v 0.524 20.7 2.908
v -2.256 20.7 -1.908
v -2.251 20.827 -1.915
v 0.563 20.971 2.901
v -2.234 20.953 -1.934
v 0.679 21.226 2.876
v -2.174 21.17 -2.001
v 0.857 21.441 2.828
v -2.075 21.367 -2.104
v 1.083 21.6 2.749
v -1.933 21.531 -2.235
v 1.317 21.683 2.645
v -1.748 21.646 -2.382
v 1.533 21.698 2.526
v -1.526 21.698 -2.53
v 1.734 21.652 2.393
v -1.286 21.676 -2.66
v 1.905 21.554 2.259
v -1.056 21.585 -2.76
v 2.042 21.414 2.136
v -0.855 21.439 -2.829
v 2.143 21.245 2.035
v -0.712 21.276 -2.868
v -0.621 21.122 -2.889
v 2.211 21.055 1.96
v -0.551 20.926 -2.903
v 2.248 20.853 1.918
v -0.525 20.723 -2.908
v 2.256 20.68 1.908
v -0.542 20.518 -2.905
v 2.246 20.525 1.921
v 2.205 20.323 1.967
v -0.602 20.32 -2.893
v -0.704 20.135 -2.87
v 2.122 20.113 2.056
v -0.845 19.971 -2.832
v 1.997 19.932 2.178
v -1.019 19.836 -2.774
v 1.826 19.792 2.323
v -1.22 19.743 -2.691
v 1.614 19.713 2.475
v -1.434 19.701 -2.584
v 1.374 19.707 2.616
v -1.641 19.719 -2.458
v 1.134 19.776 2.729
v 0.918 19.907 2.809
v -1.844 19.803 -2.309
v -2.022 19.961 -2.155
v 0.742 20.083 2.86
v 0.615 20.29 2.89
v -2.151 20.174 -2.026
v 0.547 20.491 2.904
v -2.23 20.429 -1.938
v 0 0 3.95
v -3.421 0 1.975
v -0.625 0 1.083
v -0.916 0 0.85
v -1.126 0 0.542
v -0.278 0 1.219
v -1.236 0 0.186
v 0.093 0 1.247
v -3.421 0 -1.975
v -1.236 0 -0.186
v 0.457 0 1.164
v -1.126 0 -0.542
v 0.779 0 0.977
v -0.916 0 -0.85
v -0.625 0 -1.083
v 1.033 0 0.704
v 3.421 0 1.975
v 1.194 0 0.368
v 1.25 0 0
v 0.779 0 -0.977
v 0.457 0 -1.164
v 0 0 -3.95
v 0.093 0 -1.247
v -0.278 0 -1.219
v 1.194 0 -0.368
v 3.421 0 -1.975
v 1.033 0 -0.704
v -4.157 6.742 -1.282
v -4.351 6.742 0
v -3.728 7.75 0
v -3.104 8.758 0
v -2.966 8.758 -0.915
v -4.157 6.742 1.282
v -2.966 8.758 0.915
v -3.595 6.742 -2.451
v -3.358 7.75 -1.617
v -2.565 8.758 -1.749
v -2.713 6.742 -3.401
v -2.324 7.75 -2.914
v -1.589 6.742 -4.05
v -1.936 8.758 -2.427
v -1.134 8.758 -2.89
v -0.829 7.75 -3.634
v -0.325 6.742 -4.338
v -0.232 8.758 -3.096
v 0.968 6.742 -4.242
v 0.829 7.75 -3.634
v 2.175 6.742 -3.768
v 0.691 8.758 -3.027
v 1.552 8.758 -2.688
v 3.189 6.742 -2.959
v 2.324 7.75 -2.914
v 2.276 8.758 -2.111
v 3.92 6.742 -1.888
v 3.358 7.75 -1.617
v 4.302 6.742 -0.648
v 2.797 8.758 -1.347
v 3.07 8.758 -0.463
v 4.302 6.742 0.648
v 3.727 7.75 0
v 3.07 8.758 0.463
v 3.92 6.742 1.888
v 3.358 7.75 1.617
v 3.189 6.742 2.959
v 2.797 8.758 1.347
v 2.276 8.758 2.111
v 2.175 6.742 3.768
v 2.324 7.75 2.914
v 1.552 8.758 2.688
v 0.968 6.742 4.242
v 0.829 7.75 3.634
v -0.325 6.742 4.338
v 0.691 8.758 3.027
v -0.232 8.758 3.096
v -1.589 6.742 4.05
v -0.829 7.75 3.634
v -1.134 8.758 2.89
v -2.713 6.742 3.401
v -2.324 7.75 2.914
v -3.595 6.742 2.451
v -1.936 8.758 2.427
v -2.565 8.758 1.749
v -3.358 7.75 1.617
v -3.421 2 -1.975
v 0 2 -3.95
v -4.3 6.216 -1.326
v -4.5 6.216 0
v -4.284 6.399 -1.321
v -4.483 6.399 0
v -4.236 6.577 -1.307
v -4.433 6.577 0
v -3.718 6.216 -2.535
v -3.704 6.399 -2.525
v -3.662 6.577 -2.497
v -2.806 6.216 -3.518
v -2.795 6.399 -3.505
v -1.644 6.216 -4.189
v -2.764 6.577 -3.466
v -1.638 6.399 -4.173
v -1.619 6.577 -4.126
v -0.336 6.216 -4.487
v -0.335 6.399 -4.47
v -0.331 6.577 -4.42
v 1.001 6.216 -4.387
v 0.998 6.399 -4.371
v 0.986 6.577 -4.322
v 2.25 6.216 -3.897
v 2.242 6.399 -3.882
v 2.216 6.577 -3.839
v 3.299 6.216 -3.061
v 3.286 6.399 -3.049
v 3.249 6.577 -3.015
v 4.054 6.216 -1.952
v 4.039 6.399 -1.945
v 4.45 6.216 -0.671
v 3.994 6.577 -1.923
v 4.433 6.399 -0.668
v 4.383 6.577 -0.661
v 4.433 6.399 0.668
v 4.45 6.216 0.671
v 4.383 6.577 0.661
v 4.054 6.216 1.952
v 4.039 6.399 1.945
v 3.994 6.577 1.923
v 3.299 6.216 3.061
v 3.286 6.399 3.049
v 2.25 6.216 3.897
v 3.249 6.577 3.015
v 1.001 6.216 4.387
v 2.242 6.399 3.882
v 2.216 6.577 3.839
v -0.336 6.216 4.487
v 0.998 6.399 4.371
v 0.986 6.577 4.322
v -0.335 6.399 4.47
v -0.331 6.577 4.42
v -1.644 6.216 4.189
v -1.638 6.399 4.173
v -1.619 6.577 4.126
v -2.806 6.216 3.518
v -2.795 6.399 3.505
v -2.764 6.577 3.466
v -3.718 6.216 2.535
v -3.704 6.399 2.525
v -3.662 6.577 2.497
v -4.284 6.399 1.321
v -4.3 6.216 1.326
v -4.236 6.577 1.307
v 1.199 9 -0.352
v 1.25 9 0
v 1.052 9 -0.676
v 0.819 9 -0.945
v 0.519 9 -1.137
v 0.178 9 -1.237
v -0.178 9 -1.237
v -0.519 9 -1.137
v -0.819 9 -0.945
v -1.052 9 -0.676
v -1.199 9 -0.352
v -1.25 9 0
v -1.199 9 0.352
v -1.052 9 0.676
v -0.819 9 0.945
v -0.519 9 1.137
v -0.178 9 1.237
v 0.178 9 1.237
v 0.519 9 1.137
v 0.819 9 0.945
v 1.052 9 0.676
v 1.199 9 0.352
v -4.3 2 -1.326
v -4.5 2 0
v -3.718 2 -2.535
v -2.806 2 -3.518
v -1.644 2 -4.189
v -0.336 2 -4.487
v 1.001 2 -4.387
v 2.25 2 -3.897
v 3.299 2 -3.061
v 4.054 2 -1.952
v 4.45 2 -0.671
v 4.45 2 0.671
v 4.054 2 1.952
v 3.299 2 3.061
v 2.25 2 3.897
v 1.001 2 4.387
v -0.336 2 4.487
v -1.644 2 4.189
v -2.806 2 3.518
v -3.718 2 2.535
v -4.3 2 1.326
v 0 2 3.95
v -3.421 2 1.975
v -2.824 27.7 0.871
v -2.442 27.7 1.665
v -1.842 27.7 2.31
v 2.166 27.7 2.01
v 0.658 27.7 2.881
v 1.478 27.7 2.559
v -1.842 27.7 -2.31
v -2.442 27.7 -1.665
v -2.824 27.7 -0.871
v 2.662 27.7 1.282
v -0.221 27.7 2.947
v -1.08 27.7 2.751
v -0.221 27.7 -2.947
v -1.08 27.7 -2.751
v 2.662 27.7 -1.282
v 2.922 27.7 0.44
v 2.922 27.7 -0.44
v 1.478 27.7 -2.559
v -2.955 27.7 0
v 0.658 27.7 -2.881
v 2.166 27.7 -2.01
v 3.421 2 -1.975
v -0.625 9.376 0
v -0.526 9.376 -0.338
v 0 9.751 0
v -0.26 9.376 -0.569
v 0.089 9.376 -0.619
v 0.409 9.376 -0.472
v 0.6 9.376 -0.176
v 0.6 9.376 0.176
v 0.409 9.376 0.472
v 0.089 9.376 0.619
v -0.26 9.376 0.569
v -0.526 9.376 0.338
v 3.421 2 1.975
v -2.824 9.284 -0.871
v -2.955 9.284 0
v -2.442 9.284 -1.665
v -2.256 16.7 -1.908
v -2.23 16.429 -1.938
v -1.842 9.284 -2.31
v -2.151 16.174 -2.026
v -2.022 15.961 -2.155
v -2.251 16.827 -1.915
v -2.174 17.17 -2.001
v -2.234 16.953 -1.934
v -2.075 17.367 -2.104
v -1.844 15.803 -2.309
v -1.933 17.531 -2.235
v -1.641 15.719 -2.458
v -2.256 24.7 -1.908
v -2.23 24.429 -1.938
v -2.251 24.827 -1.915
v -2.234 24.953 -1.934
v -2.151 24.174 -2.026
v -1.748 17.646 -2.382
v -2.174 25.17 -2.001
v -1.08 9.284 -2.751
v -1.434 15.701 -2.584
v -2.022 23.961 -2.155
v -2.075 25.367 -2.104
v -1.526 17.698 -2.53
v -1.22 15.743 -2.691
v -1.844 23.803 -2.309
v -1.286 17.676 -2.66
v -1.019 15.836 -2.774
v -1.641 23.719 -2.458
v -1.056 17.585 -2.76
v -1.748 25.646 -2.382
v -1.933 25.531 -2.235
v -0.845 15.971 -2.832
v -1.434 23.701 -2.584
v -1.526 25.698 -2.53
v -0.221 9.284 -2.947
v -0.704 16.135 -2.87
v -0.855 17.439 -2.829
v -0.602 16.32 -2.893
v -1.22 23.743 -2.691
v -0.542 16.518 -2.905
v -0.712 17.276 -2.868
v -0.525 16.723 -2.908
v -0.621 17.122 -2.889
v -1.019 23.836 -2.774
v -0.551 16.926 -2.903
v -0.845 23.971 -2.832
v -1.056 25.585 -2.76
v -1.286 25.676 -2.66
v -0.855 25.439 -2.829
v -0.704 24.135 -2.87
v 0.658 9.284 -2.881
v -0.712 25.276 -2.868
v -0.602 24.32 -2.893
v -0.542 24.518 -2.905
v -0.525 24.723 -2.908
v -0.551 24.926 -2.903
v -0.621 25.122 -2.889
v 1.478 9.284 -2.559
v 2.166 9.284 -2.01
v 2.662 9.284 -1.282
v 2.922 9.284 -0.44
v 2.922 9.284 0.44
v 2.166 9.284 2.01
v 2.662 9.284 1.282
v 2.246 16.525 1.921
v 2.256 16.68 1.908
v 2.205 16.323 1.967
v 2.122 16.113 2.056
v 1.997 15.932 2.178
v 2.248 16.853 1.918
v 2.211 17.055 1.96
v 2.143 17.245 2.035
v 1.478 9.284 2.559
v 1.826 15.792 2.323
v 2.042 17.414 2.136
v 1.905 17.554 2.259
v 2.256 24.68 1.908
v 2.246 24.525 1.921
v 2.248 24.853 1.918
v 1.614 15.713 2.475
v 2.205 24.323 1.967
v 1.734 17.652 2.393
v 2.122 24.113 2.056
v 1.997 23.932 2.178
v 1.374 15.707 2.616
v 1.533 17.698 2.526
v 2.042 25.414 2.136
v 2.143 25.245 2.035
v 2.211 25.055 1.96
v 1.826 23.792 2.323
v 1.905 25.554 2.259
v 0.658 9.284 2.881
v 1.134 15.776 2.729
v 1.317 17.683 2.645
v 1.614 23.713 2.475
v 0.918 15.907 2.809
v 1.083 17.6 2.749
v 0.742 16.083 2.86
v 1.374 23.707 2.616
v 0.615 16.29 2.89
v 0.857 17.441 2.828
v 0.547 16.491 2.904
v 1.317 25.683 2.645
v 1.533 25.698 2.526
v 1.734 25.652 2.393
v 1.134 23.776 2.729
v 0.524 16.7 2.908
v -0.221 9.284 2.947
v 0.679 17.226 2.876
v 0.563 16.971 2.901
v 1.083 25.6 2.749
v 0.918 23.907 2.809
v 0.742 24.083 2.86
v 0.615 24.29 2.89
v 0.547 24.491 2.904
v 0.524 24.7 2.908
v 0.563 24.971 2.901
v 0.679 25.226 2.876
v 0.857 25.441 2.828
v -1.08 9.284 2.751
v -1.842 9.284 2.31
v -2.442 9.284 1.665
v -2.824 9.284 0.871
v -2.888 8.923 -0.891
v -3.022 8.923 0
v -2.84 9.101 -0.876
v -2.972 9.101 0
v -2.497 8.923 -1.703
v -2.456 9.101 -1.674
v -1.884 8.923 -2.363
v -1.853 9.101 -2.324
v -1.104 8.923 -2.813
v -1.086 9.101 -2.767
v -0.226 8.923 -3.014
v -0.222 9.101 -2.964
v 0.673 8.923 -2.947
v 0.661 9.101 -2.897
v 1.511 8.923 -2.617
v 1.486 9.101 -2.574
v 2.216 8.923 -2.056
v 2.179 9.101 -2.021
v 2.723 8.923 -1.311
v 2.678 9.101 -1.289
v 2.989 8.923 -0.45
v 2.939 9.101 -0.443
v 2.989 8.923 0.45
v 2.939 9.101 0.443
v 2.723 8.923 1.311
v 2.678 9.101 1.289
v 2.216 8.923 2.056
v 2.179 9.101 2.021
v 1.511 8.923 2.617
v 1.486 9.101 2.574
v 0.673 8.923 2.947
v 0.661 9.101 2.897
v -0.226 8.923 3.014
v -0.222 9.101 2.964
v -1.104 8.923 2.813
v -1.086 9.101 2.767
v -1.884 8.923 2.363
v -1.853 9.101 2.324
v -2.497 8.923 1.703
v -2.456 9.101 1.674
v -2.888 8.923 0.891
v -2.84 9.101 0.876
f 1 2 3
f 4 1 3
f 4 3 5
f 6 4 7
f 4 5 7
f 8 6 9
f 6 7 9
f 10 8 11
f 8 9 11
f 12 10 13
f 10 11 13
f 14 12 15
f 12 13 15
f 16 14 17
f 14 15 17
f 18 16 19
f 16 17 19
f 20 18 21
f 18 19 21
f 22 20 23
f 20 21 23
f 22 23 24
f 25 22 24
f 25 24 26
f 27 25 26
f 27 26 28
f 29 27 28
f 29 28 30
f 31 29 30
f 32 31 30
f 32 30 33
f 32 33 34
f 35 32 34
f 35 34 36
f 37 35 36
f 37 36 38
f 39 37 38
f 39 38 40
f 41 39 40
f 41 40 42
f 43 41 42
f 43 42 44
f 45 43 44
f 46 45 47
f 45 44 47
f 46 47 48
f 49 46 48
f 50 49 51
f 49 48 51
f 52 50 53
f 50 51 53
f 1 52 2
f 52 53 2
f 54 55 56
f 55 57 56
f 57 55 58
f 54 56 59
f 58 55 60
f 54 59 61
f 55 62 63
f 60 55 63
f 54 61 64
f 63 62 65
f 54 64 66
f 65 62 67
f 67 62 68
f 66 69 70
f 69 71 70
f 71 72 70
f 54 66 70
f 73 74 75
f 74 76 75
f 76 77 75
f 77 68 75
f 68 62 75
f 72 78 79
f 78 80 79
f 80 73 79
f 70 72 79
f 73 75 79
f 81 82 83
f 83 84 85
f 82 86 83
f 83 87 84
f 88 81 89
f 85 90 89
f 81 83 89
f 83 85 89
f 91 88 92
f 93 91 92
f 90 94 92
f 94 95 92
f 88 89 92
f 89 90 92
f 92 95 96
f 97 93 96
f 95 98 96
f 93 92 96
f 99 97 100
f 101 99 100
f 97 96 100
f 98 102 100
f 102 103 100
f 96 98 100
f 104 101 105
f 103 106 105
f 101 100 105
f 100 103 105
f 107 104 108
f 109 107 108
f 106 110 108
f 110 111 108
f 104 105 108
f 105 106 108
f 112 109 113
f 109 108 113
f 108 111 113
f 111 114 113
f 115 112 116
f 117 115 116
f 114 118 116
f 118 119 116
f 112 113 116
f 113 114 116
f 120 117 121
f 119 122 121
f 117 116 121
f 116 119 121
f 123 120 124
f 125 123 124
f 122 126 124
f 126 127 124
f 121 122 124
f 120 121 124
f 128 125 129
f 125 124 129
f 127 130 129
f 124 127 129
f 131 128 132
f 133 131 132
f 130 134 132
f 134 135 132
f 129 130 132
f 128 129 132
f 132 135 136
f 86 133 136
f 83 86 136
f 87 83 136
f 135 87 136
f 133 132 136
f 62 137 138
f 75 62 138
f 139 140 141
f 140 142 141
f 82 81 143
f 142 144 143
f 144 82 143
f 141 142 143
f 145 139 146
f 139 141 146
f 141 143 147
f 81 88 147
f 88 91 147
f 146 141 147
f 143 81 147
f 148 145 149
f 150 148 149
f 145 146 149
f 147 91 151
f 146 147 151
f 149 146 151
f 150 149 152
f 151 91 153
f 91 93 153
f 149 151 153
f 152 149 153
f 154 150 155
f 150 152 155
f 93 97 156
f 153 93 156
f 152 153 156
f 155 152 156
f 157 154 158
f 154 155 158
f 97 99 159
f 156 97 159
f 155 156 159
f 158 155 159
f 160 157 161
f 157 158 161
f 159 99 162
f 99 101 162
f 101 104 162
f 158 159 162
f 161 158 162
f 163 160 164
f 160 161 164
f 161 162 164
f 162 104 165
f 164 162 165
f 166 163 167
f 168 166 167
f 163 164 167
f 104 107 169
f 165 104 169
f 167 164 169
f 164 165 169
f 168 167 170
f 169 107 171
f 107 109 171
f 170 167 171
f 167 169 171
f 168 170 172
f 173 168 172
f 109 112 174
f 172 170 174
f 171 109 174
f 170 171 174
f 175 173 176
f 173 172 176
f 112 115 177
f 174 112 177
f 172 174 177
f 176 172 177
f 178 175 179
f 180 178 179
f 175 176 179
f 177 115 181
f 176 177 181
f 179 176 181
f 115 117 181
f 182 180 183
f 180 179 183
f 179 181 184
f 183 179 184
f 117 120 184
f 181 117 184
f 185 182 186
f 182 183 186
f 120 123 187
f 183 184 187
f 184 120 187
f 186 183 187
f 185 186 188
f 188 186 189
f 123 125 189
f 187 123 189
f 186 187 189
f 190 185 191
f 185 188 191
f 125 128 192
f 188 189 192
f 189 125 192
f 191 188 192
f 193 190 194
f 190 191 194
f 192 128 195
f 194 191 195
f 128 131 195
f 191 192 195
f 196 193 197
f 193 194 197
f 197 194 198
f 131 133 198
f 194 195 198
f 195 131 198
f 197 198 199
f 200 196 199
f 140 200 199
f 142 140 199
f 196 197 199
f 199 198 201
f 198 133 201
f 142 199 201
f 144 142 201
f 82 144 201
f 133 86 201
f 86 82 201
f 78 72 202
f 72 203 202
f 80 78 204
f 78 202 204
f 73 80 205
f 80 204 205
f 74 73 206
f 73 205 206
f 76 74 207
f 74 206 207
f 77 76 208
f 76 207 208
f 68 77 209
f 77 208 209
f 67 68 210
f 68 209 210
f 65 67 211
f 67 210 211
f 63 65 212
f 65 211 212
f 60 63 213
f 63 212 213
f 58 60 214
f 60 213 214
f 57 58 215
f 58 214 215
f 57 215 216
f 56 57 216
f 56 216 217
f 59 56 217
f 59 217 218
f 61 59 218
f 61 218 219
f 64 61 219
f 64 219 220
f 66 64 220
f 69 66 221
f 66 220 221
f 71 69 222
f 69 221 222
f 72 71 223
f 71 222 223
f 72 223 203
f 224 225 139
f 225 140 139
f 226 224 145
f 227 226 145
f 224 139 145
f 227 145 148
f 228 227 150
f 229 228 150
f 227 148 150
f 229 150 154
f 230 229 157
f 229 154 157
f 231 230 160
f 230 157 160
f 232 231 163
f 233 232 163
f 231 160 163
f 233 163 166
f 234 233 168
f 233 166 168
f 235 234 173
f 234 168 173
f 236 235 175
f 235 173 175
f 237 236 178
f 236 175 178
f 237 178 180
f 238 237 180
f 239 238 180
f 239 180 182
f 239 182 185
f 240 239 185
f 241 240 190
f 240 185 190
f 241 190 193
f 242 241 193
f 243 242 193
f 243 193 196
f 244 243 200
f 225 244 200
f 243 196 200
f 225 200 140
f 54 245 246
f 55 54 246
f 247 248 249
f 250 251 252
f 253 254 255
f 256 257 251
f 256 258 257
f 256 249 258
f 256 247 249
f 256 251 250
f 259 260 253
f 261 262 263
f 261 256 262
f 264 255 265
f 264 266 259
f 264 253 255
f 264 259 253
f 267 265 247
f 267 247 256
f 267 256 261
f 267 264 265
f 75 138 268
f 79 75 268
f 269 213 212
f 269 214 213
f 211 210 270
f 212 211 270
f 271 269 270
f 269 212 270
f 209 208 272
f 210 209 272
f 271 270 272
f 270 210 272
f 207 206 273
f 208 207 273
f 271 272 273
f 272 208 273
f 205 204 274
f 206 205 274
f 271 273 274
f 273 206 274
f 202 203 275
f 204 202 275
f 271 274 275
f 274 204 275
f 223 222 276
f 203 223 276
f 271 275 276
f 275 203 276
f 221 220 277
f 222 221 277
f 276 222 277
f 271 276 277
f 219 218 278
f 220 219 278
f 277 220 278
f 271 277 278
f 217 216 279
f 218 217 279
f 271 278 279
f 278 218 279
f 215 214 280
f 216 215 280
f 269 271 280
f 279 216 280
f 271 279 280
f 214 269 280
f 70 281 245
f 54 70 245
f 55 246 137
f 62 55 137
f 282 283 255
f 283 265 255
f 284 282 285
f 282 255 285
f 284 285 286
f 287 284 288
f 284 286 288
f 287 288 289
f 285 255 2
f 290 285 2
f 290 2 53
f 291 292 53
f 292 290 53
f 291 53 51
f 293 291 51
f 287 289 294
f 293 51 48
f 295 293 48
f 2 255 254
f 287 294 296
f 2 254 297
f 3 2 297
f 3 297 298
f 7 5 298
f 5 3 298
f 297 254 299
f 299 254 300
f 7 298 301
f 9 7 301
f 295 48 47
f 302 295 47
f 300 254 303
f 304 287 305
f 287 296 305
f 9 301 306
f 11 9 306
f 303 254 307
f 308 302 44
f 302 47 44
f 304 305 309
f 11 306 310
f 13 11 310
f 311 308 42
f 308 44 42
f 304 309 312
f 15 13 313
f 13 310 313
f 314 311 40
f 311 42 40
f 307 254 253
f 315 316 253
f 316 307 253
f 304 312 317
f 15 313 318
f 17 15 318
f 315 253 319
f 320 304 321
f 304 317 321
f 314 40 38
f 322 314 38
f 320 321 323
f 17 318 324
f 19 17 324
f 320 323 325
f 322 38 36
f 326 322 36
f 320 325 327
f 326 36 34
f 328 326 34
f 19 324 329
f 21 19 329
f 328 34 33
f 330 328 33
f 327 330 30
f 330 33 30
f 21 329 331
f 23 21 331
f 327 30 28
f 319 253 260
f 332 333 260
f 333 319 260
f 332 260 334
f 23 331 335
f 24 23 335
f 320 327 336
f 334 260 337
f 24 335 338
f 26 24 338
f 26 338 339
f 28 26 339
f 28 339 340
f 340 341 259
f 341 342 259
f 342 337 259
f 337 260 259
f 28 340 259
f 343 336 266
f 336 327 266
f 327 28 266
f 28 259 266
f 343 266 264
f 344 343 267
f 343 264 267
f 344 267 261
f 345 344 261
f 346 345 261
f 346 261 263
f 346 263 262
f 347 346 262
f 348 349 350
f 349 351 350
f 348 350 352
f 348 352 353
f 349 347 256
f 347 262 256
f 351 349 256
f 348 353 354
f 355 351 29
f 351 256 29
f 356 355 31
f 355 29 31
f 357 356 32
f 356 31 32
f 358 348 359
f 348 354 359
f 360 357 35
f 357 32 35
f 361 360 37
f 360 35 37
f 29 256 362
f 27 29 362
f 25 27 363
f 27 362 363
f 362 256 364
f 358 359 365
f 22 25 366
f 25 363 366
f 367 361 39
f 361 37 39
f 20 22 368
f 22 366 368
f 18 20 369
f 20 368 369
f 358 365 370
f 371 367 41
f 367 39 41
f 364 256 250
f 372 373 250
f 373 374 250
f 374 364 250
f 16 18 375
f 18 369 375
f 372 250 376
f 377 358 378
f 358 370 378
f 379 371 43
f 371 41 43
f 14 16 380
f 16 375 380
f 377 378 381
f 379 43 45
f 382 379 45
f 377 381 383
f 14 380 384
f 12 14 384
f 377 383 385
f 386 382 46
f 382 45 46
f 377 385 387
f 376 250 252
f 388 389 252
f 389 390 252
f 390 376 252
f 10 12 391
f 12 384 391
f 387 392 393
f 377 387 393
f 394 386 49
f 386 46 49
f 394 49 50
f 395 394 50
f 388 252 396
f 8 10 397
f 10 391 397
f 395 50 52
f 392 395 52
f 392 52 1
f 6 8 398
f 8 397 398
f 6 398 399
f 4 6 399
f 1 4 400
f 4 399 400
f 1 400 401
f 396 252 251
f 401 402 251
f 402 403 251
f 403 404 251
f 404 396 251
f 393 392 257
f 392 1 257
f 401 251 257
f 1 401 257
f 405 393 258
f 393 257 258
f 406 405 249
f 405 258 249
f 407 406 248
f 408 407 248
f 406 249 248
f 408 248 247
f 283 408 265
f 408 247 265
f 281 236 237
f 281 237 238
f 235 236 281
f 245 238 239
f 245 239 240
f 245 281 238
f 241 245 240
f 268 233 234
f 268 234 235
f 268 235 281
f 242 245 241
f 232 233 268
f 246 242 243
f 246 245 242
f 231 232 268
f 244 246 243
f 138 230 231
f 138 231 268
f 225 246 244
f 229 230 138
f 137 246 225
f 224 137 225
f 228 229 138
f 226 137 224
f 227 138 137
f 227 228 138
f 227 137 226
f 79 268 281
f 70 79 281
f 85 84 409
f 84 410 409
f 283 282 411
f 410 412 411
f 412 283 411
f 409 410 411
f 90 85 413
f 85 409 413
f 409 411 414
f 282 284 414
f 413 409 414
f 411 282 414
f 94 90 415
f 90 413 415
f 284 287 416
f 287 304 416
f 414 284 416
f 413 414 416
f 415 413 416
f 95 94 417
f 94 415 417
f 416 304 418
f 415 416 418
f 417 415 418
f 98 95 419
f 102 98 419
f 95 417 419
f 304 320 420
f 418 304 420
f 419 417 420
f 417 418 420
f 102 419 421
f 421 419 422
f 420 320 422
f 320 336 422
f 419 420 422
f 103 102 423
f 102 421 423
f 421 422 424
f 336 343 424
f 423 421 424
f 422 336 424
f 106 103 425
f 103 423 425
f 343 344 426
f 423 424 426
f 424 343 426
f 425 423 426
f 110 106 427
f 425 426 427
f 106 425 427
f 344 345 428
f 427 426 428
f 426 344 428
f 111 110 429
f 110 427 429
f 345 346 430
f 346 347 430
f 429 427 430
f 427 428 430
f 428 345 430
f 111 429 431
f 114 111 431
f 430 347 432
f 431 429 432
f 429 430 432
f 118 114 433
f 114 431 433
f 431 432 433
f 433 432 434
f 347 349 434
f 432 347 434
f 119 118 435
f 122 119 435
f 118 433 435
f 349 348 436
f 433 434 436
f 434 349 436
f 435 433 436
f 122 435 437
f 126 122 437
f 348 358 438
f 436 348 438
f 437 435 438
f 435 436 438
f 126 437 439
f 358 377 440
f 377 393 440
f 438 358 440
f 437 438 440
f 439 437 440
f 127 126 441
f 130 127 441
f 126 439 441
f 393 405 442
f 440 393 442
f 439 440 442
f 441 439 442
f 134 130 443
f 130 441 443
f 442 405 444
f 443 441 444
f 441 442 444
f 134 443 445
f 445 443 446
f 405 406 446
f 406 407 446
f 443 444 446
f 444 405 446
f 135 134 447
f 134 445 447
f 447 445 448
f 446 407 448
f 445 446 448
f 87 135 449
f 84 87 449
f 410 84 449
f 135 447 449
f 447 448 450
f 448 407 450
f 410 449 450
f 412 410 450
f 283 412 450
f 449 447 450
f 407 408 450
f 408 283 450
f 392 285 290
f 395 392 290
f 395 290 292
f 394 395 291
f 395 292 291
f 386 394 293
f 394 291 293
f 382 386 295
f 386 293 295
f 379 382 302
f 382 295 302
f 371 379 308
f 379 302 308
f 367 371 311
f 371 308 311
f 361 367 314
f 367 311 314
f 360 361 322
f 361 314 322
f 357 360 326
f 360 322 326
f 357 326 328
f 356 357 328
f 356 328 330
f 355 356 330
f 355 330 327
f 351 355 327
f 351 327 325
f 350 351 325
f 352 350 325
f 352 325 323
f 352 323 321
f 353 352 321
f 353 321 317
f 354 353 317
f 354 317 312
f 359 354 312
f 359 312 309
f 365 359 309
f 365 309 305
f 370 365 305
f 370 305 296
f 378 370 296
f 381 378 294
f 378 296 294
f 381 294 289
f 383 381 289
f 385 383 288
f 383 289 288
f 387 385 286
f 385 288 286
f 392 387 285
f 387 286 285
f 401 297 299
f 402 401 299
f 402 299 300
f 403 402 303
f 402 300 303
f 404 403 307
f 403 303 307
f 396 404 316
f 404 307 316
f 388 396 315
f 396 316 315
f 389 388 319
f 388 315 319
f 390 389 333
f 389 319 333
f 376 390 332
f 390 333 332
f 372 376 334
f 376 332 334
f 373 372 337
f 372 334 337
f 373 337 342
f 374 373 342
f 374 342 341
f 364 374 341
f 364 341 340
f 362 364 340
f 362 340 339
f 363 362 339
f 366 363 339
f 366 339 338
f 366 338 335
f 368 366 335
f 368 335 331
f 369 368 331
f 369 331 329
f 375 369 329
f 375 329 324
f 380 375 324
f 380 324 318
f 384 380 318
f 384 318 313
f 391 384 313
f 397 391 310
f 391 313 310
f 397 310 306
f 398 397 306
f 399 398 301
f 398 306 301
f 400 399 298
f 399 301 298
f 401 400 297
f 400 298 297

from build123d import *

# Parameters (mm, degrees)
TAGLIO_ESTRUSIONE1_START      = -2
SCHIZZO2_R                    = 4.5
TAGLIO_ESTRUSIONE1_DEPTH      = 2
FORO_FILETTATO_M3X0_5_1_D     = 2.5
FORO_FILETTATO_M3X0_5_1_DEPTH = 9
FORO_FILETTATO_M3X0_5_1_TIP   = 0.751075774
SCHIZZO5_R                    = 1
TAGLIO_ESTRUSIONE2_DEPTH      = 34.021984674


with BuildPart() as part:
    # Schizzo1 → Rivoluzione1 (revolve)
    with BuildSketch(Plane.XY, mode=Mode.PRIVATE) as rivoluzione1_sk:
        with BuildLine():
            Line((0, 0), (4.5, 0))
            Line((4.5, 0), (4.5, 6.215934246))
            ThreePointArc((4.5, 6.215934246), (4.461941718, 6.489188945), (4.350663738, 6.741644436))
            Line((4.350663738, 6.741644436), (3.104336262, 8.758355564))
            ThreePointArc((3.104336262, 8.758355564), (2.993058282, 9.010811055), (2.955, 9.284065754))
            Line((2.955, 9.284065754), (2.955, 31.7))
            Line((2.955, 31.7), (0, 31.7))
            Line((0, 31.7), (0, 0))
        make_face()
    revolve(rivoluzione1_sk.sketch.rotate(Axis((0, 31.7, 0), (0, -1, 0)), 180), axis=Axis((0, 31.7, 0), (0, -1, 0)))

    # Schizzo2 → Taglio-Estrusione1 (cut)
    with BuildSketch(Plane.XZ.offset(TAGLIO_ESTRUSIONE1_START)):
        with Locations(Location((0, 0, 0), (0, 0, 180))):
            Circle(SCHIZZO2_R)
        Polygon((0, 3.95), (-3.420800345, 1.975), (-3.420800345, -1.975), (0, -3.95), (3.420800345, -1.975), (3.420800345, 1.975), align=None, mode=Mode.SUBTRACT)
    extrude(amount=TAGLIO_ESTRUSIONE1_DEPTH, mode=Mode.SUBTRACT)

    # Foro filettato M3x0.5-1
    with Locations(Plane(origin=(0, 0, 0), x_dir=(-1, 0, 0), z_dir=(0, -1, 0))):
        with Locations((0, 0)):
            Hole(FORO_FILETTATO_M3X0_5_1_D / 2, depth=FORO_FILETTATO_M3X0_5_1_DEPTH)
            with Locations((0, 0, -(FORO_FILETTATO_M3X0_5_1_DEPTH + FORO_FILETTATO_M3X0_5_1_TIP / 2))):  # 118° drill point
                Cone(0, FORO_FILETTATO_M3X0_5_1_D / 2, FORO_FILETTATO_M3X0_5_1_TIP, mode=Mode.SUBTRACT)

    # Schizzo5 → Taglio-Estrusione2 (cut, through all)
    with BuildSketch(Plane(origin=(-1.4775, 0, -2.559105068), x_dir=(-0.8660254037844385, 0, 0.5000000000000004), z_dir=(-0.5000000000000003, 0, -0.8660254037844384))):
        with Locations((0, 16.7)):
            Circle(SCHIZZO5_R)
        with Locations((0, 20.7)):
            Circle(SCHIZZO5_R)
        with Locations((0, 24.7)):
            Circle(SCHIZZO5_R)
        with Locations((0, 28.7)):
            Circle(SCHIZZO5_R)
    extrude(amount=-TAGLIO_ESTRUSIONE2_DEPTH, mode=Mode.SUBTRACT)

    # TaglioSuperficie1
    split(bisect_by=Plane(origin=(0, 27.7, 0), x_dir=(1, 0, 0), z_dir=(0, 1, 0)), keep=Keep.BOTTOM)


solid = part.part
